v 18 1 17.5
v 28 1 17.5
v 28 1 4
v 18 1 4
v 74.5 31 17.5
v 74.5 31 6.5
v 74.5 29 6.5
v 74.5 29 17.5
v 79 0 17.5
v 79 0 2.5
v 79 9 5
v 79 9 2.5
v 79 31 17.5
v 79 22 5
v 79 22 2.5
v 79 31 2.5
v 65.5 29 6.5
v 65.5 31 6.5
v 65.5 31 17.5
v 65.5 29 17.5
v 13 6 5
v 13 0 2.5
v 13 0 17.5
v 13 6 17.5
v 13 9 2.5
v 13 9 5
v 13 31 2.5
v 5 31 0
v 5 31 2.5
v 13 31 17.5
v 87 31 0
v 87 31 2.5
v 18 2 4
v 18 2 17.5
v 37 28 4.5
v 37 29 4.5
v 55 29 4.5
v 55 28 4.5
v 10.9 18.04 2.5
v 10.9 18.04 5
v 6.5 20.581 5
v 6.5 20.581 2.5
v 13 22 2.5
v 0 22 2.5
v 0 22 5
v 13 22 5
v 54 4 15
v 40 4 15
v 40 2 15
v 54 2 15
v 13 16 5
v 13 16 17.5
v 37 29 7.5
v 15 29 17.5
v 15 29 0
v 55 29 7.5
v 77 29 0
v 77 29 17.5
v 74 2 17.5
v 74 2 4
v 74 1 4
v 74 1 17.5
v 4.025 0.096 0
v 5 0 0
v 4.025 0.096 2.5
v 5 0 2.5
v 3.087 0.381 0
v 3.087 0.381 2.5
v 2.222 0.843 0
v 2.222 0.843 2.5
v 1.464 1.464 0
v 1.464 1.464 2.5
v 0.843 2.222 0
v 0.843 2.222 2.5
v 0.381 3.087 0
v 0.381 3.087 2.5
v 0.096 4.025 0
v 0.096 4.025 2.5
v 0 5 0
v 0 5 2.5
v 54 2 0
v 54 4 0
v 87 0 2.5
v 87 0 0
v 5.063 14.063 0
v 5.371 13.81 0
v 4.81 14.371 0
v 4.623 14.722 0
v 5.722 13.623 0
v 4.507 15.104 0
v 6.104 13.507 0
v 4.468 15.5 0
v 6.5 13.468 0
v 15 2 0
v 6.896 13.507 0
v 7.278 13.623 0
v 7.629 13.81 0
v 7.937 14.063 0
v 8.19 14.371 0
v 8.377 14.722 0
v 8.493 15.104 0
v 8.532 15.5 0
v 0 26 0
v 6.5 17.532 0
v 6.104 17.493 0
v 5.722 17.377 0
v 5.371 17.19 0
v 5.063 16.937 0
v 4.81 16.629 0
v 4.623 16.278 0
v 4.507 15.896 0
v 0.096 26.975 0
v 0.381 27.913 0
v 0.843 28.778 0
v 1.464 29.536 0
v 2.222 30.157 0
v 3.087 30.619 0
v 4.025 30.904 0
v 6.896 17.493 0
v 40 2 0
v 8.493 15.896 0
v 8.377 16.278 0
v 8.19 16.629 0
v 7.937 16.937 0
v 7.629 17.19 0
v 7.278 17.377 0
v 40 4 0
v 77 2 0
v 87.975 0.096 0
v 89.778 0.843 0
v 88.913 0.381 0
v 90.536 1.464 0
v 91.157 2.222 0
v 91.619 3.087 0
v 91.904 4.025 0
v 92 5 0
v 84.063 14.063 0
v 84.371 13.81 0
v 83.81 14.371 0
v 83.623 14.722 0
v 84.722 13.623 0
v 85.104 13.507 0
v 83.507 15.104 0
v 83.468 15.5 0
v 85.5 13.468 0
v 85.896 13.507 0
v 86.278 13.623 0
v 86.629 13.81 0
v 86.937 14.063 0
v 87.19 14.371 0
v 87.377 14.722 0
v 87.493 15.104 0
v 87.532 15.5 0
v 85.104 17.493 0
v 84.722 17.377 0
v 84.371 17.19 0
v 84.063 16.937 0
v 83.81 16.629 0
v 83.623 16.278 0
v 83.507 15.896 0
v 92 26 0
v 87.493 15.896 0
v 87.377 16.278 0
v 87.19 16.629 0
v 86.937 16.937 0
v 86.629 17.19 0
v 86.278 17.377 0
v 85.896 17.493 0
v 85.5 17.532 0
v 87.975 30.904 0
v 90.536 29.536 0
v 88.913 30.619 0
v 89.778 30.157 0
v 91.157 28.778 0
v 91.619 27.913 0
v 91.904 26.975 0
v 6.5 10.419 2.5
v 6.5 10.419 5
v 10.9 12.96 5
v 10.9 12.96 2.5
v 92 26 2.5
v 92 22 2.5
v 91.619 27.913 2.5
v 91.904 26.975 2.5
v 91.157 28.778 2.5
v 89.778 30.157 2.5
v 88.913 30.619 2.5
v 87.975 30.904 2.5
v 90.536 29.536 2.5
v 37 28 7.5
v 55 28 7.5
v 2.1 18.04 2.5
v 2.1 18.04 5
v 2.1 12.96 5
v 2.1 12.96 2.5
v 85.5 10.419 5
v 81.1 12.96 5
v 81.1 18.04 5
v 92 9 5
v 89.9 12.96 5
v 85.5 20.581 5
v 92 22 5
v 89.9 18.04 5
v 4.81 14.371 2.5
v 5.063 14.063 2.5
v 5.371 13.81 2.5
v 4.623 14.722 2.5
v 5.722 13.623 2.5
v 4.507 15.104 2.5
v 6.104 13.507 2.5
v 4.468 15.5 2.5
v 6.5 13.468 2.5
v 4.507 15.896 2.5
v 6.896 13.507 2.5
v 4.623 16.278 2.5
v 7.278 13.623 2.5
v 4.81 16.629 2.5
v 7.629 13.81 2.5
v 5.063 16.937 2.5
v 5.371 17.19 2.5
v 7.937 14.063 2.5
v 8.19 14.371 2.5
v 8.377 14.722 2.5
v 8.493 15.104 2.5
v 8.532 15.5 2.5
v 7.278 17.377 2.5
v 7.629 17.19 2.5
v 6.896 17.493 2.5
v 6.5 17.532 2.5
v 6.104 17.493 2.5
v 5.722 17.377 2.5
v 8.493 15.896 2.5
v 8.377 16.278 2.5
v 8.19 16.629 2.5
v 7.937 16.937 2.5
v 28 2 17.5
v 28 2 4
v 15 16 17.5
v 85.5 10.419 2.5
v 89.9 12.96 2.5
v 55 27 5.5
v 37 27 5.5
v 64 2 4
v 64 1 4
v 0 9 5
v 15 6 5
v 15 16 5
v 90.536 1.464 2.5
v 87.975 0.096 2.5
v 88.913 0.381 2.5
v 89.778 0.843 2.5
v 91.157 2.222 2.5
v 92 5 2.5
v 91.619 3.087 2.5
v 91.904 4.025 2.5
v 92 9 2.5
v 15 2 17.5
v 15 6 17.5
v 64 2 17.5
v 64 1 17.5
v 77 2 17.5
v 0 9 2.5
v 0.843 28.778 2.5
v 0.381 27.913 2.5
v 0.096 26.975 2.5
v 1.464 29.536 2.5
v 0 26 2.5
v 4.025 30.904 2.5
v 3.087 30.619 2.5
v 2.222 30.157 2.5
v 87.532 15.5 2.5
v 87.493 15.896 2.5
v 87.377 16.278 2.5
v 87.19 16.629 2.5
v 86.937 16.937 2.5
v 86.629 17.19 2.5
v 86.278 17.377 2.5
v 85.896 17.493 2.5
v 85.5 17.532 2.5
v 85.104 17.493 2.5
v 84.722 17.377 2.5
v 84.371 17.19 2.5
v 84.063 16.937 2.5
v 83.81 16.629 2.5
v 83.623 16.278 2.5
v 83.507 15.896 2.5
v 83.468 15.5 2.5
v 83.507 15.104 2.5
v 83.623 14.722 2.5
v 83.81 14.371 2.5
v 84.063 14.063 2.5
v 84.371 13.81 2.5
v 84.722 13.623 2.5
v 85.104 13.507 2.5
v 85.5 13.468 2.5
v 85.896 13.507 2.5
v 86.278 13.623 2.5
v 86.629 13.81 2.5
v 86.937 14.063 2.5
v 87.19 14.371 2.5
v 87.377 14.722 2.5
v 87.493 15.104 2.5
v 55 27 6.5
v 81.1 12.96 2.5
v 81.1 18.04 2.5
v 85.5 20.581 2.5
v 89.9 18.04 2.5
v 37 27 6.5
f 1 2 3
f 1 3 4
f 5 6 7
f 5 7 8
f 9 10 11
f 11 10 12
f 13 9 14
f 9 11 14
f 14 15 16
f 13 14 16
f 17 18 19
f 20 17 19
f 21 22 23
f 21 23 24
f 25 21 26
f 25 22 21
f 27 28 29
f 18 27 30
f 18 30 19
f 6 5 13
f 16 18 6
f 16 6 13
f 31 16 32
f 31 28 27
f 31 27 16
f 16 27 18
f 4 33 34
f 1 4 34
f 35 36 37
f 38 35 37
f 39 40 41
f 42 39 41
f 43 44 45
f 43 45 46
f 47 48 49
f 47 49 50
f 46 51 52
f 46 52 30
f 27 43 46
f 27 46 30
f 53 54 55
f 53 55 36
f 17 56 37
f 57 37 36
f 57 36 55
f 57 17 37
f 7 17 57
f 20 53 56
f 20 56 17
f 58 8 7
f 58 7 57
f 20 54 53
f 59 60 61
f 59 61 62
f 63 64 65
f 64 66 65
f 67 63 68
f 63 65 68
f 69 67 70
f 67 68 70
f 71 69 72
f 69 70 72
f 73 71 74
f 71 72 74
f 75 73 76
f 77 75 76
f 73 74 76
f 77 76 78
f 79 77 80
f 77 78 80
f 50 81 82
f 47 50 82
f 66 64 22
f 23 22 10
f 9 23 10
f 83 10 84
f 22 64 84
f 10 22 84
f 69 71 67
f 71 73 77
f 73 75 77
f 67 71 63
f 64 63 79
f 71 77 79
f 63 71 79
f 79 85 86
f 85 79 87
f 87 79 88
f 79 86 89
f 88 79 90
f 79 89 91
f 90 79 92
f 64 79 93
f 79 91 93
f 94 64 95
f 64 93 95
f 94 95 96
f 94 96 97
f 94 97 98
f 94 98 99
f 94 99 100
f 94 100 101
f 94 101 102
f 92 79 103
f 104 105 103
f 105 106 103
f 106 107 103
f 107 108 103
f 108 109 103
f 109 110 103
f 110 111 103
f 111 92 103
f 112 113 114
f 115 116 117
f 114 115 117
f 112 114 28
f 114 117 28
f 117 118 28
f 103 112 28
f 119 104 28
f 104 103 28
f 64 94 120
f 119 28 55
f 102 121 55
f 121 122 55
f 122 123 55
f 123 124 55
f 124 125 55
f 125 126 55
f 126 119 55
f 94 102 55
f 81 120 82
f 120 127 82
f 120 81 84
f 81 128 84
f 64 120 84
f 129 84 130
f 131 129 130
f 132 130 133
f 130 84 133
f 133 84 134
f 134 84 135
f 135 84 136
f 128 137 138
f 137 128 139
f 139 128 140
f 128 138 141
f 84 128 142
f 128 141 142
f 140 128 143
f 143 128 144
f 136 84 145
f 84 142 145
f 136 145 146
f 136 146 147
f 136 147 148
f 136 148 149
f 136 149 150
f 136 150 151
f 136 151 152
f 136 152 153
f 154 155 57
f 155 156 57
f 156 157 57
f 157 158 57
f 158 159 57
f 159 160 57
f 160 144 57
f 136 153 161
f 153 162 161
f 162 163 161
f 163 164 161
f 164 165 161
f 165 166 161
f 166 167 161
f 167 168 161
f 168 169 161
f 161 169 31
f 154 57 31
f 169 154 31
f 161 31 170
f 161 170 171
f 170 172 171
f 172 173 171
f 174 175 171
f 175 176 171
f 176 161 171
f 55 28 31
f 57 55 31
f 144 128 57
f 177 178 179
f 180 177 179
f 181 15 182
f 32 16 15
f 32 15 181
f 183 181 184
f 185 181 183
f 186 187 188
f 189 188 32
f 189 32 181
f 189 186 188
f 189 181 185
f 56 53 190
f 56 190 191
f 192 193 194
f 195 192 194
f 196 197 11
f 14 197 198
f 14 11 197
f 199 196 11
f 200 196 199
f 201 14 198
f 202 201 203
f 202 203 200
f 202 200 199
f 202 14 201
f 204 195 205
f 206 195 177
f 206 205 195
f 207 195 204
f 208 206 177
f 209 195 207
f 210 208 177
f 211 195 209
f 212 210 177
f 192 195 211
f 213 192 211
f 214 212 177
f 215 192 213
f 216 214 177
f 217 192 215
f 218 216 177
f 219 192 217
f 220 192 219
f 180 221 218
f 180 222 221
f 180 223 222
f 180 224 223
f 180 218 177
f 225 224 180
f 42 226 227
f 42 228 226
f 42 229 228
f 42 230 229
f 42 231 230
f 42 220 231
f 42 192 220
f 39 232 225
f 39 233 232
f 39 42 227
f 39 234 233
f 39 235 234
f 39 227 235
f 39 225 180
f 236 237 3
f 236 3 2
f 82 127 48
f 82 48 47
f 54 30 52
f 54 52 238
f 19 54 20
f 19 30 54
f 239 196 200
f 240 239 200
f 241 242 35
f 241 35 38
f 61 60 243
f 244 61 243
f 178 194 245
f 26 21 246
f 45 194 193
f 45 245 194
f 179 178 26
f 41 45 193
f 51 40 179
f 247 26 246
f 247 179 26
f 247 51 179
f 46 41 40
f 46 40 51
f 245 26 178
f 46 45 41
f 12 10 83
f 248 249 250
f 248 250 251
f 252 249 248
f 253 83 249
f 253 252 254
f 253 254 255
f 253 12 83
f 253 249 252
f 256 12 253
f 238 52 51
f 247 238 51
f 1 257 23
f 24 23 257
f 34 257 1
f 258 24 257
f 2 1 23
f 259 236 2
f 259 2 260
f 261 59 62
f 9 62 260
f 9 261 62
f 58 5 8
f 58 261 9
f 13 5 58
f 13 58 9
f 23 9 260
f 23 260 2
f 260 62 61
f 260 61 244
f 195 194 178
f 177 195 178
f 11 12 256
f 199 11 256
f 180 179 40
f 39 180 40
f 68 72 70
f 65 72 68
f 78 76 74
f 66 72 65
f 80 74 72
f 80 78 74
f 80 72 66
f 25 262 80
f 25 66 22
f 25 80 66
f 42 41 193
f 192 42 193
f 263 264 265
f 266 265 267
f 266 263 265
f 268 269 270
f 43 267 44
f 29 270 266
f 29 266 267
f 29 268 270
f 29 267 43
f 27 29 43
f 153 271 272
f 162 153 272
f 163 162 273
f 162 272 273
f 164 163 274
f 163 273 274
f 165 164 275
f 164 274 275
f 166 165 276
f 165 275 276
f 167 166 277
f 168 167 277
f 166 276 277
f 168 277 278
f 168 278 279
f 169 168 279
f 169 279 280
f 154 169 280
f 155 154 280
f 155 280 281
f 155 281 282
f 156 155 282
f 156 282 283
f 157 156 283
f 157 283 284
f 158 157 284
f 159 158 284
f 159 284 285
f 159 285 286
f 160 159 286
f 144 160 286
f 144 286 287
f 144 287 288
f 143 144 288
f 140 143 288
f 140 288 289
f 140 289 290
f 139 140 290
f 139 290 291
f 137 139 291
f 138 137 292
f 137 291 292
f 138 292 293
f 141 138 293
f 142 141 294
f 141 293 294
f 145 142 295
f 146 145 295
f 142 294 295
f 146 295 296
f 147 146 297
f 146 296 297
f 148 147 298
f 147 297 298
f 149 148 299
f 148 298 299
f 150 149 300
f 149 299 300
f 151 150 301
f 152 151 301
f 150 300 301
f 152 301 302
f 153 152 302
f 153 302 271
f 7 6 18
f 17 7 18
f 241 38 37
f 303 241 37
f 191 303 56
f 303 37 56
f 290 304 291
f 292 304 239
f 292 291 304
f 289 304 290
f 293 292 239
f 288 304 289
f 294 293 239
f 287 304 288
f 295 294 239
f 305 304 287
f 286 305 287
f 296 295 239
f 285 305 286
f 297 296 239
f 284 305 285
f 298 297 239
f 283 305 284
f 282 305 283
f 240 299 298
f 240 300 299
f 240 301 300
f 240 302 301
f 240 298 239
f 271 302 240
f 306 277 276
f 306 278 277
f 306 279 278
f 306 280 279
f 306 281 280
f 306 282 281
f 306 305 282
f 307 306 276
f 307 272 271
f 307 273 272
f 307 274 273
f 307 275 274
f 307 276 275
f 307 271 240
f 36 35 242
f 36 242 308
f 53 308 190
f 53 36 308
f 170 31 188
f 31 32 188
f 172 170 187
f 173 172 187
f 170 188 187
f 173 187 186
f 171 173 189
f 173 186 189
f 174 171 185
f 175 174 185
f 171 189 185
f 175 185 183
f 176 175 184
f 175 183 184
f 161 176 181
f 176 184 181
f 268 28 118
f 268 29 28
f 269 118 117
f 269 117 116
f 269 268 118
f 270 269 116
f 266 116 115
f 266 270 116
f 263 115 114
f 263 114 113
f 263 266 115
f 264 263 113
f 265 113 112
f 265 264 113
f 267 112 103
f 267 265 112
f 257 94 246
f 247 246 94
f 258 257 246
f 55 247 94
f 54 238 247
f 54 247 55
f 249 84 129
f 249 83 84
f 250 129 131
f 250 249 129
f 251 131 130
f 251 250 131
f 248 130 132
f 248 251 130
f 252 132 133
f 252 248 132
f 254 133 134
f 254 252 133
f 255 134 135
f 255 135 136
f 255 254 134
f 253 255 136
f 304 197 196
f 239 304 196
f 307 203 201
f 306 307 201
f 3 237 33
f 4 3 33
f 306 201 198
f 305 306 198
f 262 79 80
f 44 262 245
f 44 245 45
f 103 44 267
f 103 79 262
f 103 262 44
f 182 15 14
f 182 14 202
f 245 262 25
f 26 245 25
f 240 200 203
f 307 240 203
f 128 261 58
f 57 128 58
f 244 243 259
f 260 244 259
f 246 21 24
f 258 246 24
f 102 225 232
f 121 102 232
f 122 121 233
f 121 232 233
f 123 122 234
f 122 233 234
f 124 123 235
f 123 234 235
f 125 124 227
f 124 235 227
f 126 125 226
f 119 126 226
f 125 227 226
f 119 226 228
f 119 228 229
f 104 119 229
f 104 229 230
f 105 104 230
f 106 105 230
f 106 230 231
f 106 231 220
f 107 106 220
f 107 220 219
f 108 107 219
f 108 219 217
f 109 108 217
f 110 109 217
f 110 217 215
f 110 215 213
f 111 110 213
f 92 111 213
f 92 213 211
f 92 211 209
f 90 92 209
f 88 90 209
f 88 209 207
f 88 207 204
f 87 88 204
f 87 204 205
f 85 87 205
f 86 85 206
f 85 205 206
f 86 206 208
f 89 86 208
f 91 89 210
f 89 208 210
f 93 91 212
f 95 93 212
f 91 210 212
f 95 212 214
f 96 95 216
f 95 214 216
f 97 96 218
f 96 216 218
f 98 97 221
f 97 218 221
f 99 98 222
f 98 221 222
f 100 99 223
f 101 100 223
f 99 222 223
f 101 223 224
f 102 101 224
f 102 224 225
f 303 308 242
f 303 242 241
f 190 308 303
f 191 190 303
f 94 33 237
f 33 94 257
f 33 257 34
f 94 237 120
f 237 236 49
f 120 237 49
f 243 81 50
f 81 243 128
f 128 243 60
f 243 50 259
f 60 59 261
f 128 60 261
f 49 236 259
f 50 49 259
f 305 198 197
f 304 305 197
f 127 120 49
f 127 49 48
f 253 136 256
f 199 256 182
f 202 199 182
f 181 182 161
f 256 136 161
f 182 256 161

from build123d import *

# Parameters (mm, degrees)
F0_W      = 92
F0_H      = 31
F1_DEPTH  = 2.5
F2_W      = 66
F2_H      = 31
F2_W_2    = 62
F2_H_2    = 27
F3_DEPTH  = 15
F3_FACE_W = 62
F3_FACE_H = 27
F4_DEPTH  = 25
F5_W      = 13
F5_H      = 13
F6_DEPTH  = 2.5
F7_R      = 2.032
F8_DEPTH  = 5.001
F10_DEPTH = 2.5
F11_W     = 14
F11_H     = 2
F12_DEPTH = 15
F14_DEPTH = 2
F15_W     = 18
F15_H     = 3
F16_DEPTH = 2
F17_SIZE  = 1
F18_R     = 5
F19_W     = 10
F19_H     = 13.5
F20_DEPTH = 1
F21_W     = 9
F21_H     = 11
F22_DEPTH = 2


with BuildPart() as f1:
    # F0 (on Top) → F1 (new body)
    with BuildSketch(Plane.XY):
        with Locations((46, 15.5)):
            Rectangle(F0_W, F0_H)
    extrude(amount=F1_DEPTH)

    # F2 (on face) → F3 (join)
    with BuildSketch(Plane.XY.offset(2.5)):
        with Locations((46, 15.5)):
            Rectangle(F2_W, F2_H)
        with Locations((46, 15.5)):
            Rectangle(F2_W_2, F2_H_2, mode=Mode.SUBTRACT)
    extrude(amount=F3_DEPTH)

    # F3_face (on face) → F4 (cut)
    with BuildSketch(Plane(origin=(46, 15.5, 2.5), x_dir=(1, 0, 0), z_dir=(0, 0, 1))):
        Rectangle(F3_FACE_W, F3_FACE_H)
    extrude(amount=-F4_DEPTH, mode=Mode.SUBTRACT)

    # F5 (on face) → F6 (join)
    with BuildSketch(Plane.XY.offset(2.5)):
        with Locations((85.5, 15.5)):
            Rectangle(F5_W, F5_H)
        with Locations((6.5, 15.5)):
            Rectangle(F5_W, F5_H)
    extrude(amount=F6_DEPTH)

    # F7 (on face) → F8 (cut, through all)
    with BuildSketch(Plane.XY.offset(5)):
        with Locations((85.5, 15.5)):
            Circle(F7_R)
        with Locations((6.5, 15.5)):
            Circle(F7_R)
    extrude(amount=-F8_DEPTH, mode=Mode.SUBTRACT)

    # F9 (on face) → F10 (cut, through all)
    with BuildSketch(Plane.XY.offset(5)):
        Polygon((2.1, 18.040341), (2.1, 12.959659), (6.5, 10.419318), (10.9, 12.959659), (10.9, 18.040341), (6.5, 20.580682), align=None)
        Polygon((81.1, 12.959659), (85.5, 10.419318), (89.9, 12.959659), (89.9, 18.040341), (85.5, 20.580682), (81.1, 18.040341), align=None)
    extrude(amount=-F10_DEPTH, mode=Mode.SUBTRACT)

    # F11 (on Top) → F12 (join)
    with BuildSketch(Plane.XY):
        with Locations((47, 3)):
            Rectangle(F11_W, F11_H)
    extrude(amount=F12_DEPTH)

    # F13 (on face) → F14 (cut, through all)
    with BuildSketch(Plane(origin=(13, 0, 0), x_dir=(0, -1, 0), z_dir=(-1, 0, 0))):
        Polygon((-16, 17.5), (-16, 5), (-9, 5), (-6, 5), (-6, 17.5), align=None)
    extrude(amount=-F14_DEPTH, mode=Mode.SUBTRACT)

    # F15 (on face) → F16 (join)
    with BuildSketch(Plane.XZ.offset(-29)):
        with Locations((46, 6)):
            Rectangle(F15_W, F15_H)
    extrude(amount=F16_DEPTH)

    # F17
    f17_edges = [f1.edges().sort_by_distance(p)[0] for p in [
        (46, 27, 7.5),
        (46, 27, 4.5),
    ]]
    chamfer(f17_edges, length=F17_SIZE)

    # F18
    f18_edges = [f1.edges().sort_by_distance(p)[0] for p in [
        (0, 0, 1.25),
        (0, 31, 1.25),
        (92, 0, 1.25),
        (92, 31, 1.25),
    ]]
    fillet(f18_edges, radius=F18_R)

    # F19 (on face) → F20 (cut)
    with BuildSketch(Plane(origin=(0, 2, 0), x_dir=(-1, 0, 0), z_dir=(0, 1, 0))):
        with Locations((-69, 10.75)):
            Rectangle(F19_W, F19_H)
        with Locations((-23, 10.75)):
            Rectangle(F19_W, F19_H)
    extrude(amount=-F20_DEPTH, mode=Mode.SUBTRACT)

    # F21 (on face) → F22 (cut, through all)
    with BuildSketch(Plane(origin=(0, 31, 0), x_dir=(-1, 0, 0), z_dir=(0, 1, 0))):
        with Locations((-70, 12)):
            Rectangle(F21_W, F21_H)
    extrude(amount=-F22_DEPTH, mode=Mode.SUBTRACT)


solid = f1.part
